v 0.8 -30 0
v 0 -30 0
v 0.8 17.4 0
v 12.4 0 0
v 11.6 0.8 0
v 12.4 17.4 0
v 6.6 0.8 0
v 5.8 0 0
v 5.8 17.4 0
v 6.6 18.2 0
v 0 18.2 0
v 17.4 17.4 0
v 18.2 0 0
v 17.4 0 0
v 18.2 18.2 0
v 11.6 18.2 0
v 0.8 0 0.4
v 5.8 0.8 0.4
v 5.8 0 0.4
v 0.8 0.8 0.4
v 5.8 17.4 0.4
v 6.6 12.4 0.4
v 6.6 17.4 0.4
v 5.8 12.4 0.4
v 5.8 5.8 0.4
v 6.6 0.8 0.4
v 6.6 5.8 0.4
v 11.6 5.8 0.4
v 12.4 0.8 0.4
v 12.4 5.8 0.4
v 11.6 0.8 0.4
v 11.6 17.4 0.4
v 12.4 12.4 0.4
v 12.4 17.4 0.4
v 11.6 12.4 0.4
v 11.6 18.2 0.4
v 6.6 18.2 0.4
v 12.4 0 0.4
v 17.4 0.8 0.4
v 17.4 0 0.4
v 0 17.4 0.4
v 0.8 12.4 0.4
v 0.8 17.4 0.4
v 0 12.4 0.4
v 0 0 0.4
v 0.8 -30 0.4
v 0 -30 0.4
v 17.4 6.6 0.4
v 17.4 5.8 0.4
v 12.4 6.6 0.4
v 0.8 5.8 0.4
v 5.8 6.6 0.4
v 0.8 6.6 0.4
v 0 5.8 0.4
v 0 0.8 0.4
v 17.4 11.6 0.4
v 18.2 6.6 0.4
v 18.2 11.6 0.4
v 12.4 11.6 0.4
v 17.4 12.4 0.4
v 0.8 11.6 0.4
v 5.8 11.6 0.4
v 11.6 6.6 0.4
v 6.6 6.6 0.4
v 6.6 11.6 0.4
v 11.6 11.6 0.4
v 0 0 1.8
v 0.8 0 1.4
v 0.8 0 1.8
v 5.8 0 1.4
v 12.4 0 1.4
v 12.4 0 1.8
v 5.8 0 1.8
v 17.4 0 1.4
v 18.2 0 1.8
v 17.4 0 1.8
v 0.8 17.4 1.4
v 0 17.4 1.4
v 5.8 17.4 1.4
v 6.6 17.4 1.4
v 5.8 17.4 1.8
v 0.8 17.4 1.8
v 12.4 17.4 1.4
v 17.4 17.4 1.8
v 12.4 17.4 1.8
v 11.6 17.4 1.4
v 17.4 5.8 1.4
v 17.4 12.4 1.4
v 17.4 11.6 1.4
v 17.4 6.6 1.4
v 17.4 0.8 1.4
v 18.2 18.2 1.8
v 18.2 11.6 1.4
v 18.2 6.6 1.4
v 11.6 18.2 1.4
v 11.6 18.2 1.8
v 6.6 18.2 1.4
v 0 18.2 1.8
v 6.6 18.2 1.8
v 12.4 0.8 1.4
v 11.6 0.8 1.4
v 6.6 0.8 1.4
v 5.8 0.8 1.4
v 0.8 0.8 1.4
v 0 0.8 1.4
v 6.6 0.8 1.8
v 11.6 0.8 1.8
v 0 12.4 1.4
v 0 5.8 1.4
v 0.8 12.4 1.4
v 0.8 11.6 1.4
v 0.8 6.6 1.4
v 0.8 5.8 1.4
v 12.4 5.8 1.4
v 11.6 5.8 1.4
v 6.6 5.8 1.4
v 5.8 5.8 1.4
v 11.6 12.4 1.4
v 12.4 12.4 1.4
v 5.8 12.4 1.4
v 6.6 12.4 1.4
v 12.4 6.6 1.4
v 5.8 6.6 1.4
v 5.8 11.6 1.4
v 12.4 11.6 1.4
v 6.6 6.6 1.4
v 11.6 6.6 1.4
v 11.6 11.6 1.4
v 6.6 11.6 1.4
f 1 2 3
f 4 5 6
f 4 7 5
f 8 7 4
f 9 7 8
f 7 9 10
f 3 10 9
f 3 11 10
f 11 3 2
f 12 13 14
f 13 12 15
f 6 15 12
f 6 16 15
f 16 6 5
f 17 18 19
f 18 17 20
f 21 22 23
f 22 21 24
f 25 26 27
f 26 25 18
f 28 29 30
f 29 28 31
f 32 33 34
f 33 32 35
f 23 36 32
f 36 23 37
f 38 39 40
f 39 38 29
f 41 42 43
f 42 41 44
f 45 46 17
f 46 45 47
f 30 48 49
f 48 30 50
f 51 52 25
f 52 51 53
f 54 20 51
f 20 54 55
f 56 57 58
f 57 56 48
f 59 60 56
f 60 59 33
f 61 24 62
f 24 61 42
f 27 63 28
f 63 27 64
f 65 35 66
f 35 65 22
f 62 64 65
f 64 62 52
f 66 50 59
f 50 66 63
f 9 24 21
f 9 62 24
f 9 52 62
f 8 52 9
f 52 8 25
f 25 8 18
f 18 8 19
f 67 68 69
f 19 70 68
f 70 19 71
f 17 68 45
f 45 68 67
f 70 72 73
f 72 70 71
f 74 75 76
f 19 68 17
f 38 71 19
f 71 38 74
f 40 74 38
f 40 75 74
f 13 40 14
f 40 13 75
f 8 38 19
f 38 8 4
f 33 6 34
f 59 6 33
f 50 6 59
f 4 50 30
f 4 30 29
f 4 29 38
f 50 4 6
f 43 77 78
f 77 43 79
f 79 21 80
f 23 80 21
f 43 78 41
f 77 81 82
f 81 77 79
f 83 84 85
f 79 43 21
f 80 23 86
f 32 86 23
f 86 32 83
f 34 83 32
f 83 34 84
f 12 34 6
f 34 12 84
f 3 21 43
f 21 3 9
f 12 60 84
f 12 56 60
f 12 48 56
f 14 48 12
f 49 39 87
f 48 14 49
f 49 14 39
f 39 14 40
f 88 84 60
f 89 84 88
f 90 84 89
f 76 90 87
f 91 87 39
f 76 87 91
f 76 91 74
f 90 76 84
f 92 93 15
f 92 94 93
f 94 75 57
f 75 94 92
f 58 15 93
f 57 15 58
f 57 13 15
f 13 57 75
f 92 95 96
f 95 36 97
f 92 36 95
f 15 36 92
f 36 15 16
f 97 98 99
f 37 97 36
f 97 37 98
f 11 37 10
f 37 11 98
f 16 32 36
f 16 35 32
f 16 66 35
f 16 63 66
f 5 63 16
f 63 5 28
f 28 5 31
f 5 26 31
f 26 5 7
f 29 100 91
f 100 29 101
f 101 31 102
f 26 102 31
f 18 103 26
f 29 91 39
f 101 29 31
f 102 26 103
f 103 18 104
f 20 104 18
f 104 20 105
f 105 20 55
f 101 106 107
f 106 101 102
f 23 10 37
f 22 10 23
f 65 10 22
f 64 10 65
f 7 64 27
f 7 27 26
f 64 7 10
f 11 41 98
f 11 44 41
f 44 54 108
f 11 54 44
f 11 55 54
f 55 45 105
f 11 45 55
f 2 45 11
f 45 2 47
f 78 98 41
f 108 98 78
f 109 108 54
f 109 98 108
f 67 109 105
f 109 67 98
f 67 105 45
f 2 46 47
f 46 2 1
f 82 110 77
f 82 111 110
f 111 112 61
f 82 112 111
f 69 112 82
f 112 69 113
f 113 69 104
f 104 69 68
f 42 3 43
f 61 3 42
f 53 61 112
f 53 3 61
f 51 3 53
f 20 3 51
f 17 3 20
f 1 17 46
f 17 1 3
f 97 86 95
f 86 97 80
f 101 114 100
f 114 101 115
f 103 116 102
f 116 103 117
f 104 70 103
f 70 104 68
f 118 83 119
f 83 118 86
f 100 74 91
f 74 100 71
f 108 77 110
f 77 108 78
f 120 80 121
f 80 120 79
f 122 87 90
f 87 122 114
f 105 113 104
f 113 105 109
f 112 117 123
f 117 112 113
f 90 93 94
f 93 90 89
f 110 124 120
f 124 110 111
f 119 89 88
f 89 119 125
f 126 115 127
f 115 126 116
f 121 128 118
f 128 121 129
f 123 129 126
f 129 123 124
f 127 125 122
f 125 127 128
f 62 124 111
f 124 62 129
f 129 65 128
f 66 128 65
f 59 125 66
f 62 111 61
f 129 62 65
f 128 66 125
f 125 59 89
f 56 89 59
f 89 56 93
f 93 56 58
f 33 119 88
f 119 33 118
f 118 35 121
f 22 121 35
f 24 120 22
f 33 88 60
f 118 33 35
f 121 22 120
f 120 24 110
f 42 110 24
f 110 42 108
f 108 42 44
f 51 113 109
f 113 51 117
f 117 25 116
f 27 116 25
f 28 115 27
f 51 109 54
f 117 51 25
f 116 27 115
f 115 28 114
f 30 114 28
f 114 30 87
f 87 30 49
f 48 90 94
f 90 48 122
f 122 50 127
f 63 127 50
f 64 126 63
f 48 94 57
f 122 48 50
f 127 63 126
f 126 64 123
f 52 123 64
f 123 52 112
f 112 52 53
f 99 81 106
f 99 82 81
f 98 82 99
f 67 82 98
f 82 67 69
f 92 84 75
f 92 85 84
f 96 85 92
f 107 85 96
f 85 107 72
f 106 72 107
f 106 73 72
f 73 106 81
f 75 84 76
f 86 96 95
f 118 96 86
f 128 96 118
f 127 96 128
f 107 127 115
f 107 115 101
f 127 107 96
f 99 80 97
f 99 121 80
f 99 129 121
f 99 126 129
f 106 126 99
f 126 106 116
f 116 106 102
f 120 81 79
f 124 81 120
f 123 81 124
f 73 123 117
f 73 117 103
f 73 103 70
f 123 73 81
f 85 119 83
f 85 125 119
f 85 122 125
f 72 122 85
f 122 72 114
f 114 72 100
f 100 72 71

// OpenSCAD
// file: ../../api/v3/reporting.scad
//////////////////////////////////////////////////////////////////////
// LibFile: reporting.scad
// Project: Grid Stack
// FileGroup: API v3 Reporting
// FileSummary: Console report for immutable direct and positive-gap coupons.
// Role: Records the exact environment, dimensions, support strategy, path
//       lengths, qualification status, and deposited-layer counts.
// Requires: API v3 indexes, mathematics, and path generator.
// Exports: report_structural_coupon_object().
//////////////////////////////////////////////////////////////////////

function _bridge_status3(span, process) =
    span <= process[PX3_BRIDGE_MAX]
        ? "within_owner_tested_limit"
        : "exploratory_beyond_owner_tested_limit";

module report_structural_coupon_object(object, report_level = "full") {
    material = object[SCO_MATERIAL];
    nozzle = object[SCO_NOZZLE];
    printer = object[SCO_PRINTER];
    process = object[SCO_PROCESS];
    boundary = object[SCO_BOUNDARY];
    gap = object[SCO_CLEAR_GAP];
    strategy = object[SCO_SUPPORT_STRATEGY];

    echo("--- Grid Stack immutable structural coupon ---");
    echo(str("Object: ", object[SCO_NAME], " revision ", object[SCO_REVISION]));
    echo(str("API/schema: ", object[SCO_REQUIRED_API], "/",
        object[SCO_SCHEMA_VERSION]));
    echo(str("Release/base commit: ", object[SCO_SOURCE_RELEASE], " / ",
        object[SCO_FRAMEWORK_BASE_COMMIT]));
    echo(str("Material/nozzle/printer: ", material[MAT3_FAMILY], " / ",
        nozzle[NZ3_DIAMETER], " mm / ", printer[PRN3_NAME]));
    echo(str("Cells: ", boundary[B3_CELLS_X], " x ", boundary[B3_CELLS_Y]));
    echo(str("Clear spans: ", boundary[B3_CLEAR_SPAN_X], " x ",
        boundary[B3_CLEAR_SPAN_Y], " mm"));
    echo(str("Span status: ",
        _bridge_status3(boundary[B3_CLEAR_SPAN_X], process)));
    echo(str("Outside size: ", boundary_size_x3(boundary, process, nozzle),
        " x ", boundary_size_y3(boundary, process, nozzle), " mm"));
    echo(str("Primitive trace: ", trace_width3(nozzle), " x ",
        trace_height3(process), " mm"));
    echo(str("Structural strand: ", strand_width3(process, nozzle), " x ",
        strand_height3(process), " mm"));
    echo(str("Clear vertical gap: ", gap, " mm"));
    echo(str("Support strategy: ", strategy));
    echo(str("Total modeled height: ", coupon_total_height3(object), " mm"));

    if (report_level == "full") {
        if (strategy == "direct_orthogonal") {
            lower = coupon_path(
                boundary, process, nozzle, 0, object[SCO_LEAD_IN]
            );
            upper = coupon_path(boundary, process, nozzle, 90, 0);
            echo(str("Lower/upper path lengths: ", path_length3(lower),
                " / ", path_length3(upper), " mm"));
            echo(str("Deposited layers: ", 2 * process[PX3_HEIGHT_PASSES]));
        }
        else {
            witness = coupon_path(
                boundary, process, nozzle, 90, object[SCO_LEAD_IN]
            );
            riser = coupon_path(boundary, process, nozzle, 0, 0);
            test = coupon_path(boundary, process, nozzle, 90, 0);
            echo(str("Witness/riser/test path lengths: ",
                path_length3(witness), " / ", path_length3(riser), " / ",
                path_length3(test), " mm"));
            echo(str("Riser deposited layers: ", round(gap_layer_count3(object))));
            echo(str("Total deposited layers: ",
                2 * process[PX3_HEIGHT_PASSES] +
                round(gap_layer_count3(object))));
        }
        echo(str("Status: ", object[SCO_STATUS]));
        echo(str("Notes: ", object[SCO_NOTES]));
    }
}
// file: ../../api/v3/validation.scad
//////////////////////////////////////////////////////////////////////
// LibFile: validation.scad
// Project: Grid Stack
// FileGroup: API v3 Validation
// FileSummary: Validates immutable environment records, count boundaries,
//              support strategy, path continuity, and layer quantization.
// Role: Rejects incompatible or physically floating recipes before geometry
//       is generated.
// Requires: API v3 indexes, mathematics, and path generator.
// Exports: validate_structural_coupon_object().
//////////////////////////////////////////////////////////////////////

module _validate_path3(points, boundary, orientation, lead_in) {
    run_count = orientation == 0
        ? boundary_strand_count_y3(boundary)
        : boundary_strand_count_x3(boundary);

    assert(len(points) == expected_coupon_point_count3(run_count, lead_in),
        "API v3 coupon path has an unexpected point count.");
    assert(!path_has_zero_segment3(points),
        "API v3 coupon path contains a zero-length segment.");
    assert(path_axis_aligned3(points),
        "API v3 coupon path must remain axis-aligned.");
    assert(points[0] != points[len(points) - 1],
        "API v3 coupon path must remain open.");
}

module validate_structural_coupon_object(object) {
    assert(object[SCO_REQUIRED_API] == GRID_STACK_API_VERSION,
        "Saved coupon requires a different Grid Stack API version.");
    assert(object[SCO_SCHEMA_VERSION] == GRID_STACK_COUPON_SCHEMA_VERSION,
        "Saved coupon requires a different coupon schema version.");
    assert(GRID_STACK_RECTANGULAR_FRAMEWORK_VERSION == 2,
        "Saved coupon requires rectangular framework version 2.");

    material = object[SCO_MATERIAL];
    nozzle = object[SCO_NOZZLE];
    printer = object[SCO_PRINTER];
    process = object[SCO_PROCESS];
    boundary = object[SCO_BOUNDARY];
    gap = object[SCO_CLEAR_GAP];
    lead_in = object[SCO_LEAD_IN];
    strategy = object[SCO_SUPPORT_STRATEGY];

    assert(nozzle[NZ3_DIAMETER] > 0,
        "Saved coupon nozzle diameter must be positive.");
    assert(process[PX3_LAYER_H] > 0,
        "Saved coupon layer height must be positive.");
    assert(process[PX3_WIDTH_PASSES] >= 2,
        "Saved coupon structural width requires at least two passes.");
    assert(process[PX3_HEIGHT_PASSES] >= 2,
        "Saved coupon structural height requires at least two layers.");
    assert(process[PX3_MATERIAL] == material[MAT3_NAME],
        "Saved coupon process/material references do not match.");
    assert(process[PX3_NOZZLE] == nozzle[NZ3_NAME],
        "Saved coupon process/nozzle references do not match.");
    assert(process[PX3_PRINTER] == printer[PRN3_NAME],
        "Saved coupon process/printer references do not match.");
    assert(boundary[B3_CELLS_X] > 0 && boundary[B3_CELLS_Y] > 0,
        "Saved coupon cell counts must be positive.");
    assert(boundary[B3_CLEAR_SPAN_X] > 0 &&
           boundary[B3_CLEAR_SPAN_Y] > 0,
        "Saved coupon clear spans must be positive.");
    assert(lead_in >= 0,
        "Saved coupon lead-in cannot be negative.");
    assert(gap >= 0,
        "Saved coupon clear gap cannot be negative.");
    assert(nearly_equal3(gap_layer_count3(object), round(gap_layer_count3(object))),
        "Saved coupon clear gap must equal a whole deposited-layer count.");
    assert(
        (strategy == "direct_orthogonal" && nearly_equal3(gap, 0)) ||
        (strategy == "witness_riser_bridge" && gap > 0),
        "Saved coupon support strategy does not match its clear gap."
    );

    if (strategy == "direct_orthogonal") {
        lower = coupon_path(boundary, process, nozzle, 0, lead_in);
        upper = coupon_path(boundary, process, nozzle, 90, 0);
        _validate_path3(lower, boundary, 0, lead_in);
        _validate_path3(upper, boundary, 90, 0);
        entry = lead_in > 0 ? 1 : 0;
        assert(nearly_equal3(point_distance_2d3(lower[entry], upper[0]), 0),
            "Direct upper path must start on the lower entry crossing.");
    }
    else {
        witness = coupon_path(boundary, process, nozzle, 90, lead_in);
        riser = coupon_path(boundary, process, nozzle, 0, 0);
        test = coupon_path(boundary, process, nozzle, 90, 0);
        _validate_path3(witness, boundary, 90, lead_in);
        _validate_path3(riser, boundary, 0, 0);
        _validate_path3(test, boundary, 90, 0);
        entry = lead_in > 0 ? 1 : 0;
        assert(nearly_equal3(point_distance_2d3(witness[entry], riser[0]), 0),
            "Riser path must start on the witness entry crossing.");
        assert(nearly_equal3(point_distance_2d3(riser[0], test[0]), 0),
            "Upper test path must start on the riser entry crossing.");
        for (i = [0 : len(test) - 1])
            assert(nearly_equal3(point_distance_2d3(test[i], witness[i + entry]), 0),
                "Upper test path must align directly above the witness path.");
    }

    echo("GRID STACK API V3 COUPON VALIDATION: PASS");
}
// file: ../../api/v3/geometry.scad
//////////////////////////////////////////////////////////////////////
// LibFile: geometry.scad
// Project: Grid Stack
// FileGroup: API v3 Printable Geometry
// FileSummary: Creates square-ended structural paths, direct-contact coupons,
//              positive witness/riser/bridge coupons, and simple diagnostics.
// Role: Supplies all geometry used by immutable API v3 recipes without
//       importing mutable workbench geometry.
// Requires: API v3 mathematics and ordered axis-aligned paths.
// Exports: render_direct_coupon(), render_positive_gap_coupon(), and
//          render_coupon_path_debug().
//////////////////////////////////////////////////////////////////////

module _segment_2d3(a, b, width) {
    horizontal = nearly_equal3(a[1], b[1]);
    vertical = nearly_equal3(a[0], b[0]);

    assert(horizontal || vertical,
        "API v3 printable segments must be horizontal or vertical.");
    assert(!nearly_equal3(point_distance_2d3(a, b), 0),
        "API v3 printable segments must have nonzero length.");

    if (horizontal)
        translate([min(a[0], b[0]) - width / 2, a[1] - width / 2])
            square([abs(b[0] - a[0]) + width, width]);
    else
        translate([a[0] - width / 2, min(a[1], b[1]) - width / 2])
            square([width, abs(b[1] - a[1]) + width]);
}

module _path_2d3(points, width) {
    union()
        for (i = [0 : len(points) - 2])
            _segment_2d3(points[i], points[i + 1], width);
}

module _structural_path3(points, process, nozzle) {
    linear_extrude(height = strand_height3(process), convexity = 10)
        _path_2d3(points, strand_width3(process, nozzle));
}

module render_direct_coupon(lower, upper, process, nozzle) {
    union() {
        _structural_path3(lower, process, nozzle);
        translate([0, 0, strand_height3(process)])
            _structural_path3(upper, process, nozzle);
    }
}

module render_positive_gap_coupon(
    witness, riser, test, process, nozzle, clear_gap
) {
    union() {
        _structural_path3(witness, process, nozzle);

        translate([0, 0, strand_height3(process)])
            linear_extrude(height = clear_gap, convexity = 10)
                _path_2d3(riser, strand_width3(process, nozzle));

        translate([0, 0, strand_height3(process) + clear_gap])
            _structural_path3(test, process, nozzle);
    }
}

module _debug_path3(points, z, width) {
    translate([0, 0, z])
        linear_extrude(height = 0.04)
            _path_2d3(points, width);
}

module render_coupon_path_debug(
    lower, upper, riser, process, clear_gap = 0
) {
    width = max(0.12, trace_height3(process));
    _debug_path3(lower, 0, width);
    if (len(riser) > 0)
        _debug_path3(riser, strand_height3(process), width);
    _debug_path3(
        upper,
        strand_height3(process) + clear_gap,
        width
    );
}
// file: ../../api/v3/paths.scad
//////////////////////////////////////////////////////////////////////
// LibFile: paths.scad
// Project: Grid Stack
// FileGroup: API v3 Path Generation
// FileSummary: Generates one open rectangular serpentine centerline from a
//              count boundary for X- or Y-running structural paths.
// Role: Preserves parallel runs, square connectors, optional single lead-in,
//       and one uninterrupted ordered point list per deposited layer.
// Requires: API v3 indexes and mathematics.
// Exports: coupon_path() and expected_coupon_point_count3().
//////////////////////////////////////////////////////////////////////

function _x_rows3(row, count, x_min, x_max, y_min, pitch) =
    row >= count
        ? []
        : let(
            y = y_min + row * pitch,
            x_end = row % 2 == 0 ? x_max : x_min,
            row_end = [x_end, y],
            connector_end = [x_end, y + pitch]
        )
        concat(
            [row_end],
            row < count - 1 ? [connector_end] : [],
            _x_rows3(row + 1, count, x_min, x_max, y_min, pitch)
        );

function _y_columns3(column, count, x_min, y_min, y_max, pitch) =
    column >= count
        ? []
        : let(
            x = x_min + column * pitch,
            y_end = column % 2 == 0 ? y_max : y_min,
            column_end = [x, y_end],
            connector_end = [x + pitch, y_end]
        )
        concat(
            [column_end],
            column < count - 1 ? [connector_end] : [],
            _y_columns3(column + 1, count, x_min, y_min, y_max, pitch)
        );

function expected_coupon_point_count3(run_count, lead_in = 0) =
    2 * run_count + (lead_in > 0 ? 1 : 0);

function coupon_path(
    boundary, process, nozzle, orientation = 0, lead_in = 0
) =
    assert(orientation == 0 || orientation == 90,
        "API v3 coupon orientation must be 0 or 90 degrees.")
    assert(lead_in >= 0,
        "API v3 coupon lead-in cannot be negative.")
    let(
        width = strand_width3(process, nozzle),
        x_min = width / 2,
        y_min = width / 2,
        x_max = boundary_size_x3(boundary, process, nozzle) - width / 2,
        y_max = boundary_size_y3(boundary, process, nozzle) - width / 2,
        entry = [x_min, y_min],
        prefix = lead_in > 0
            ? (orientation == 0
                ? [[x_min - lead_in, y_min], entry]
                : [[x_min, y_min - lead_in], entry])
            : [entry]
    )
    orientation == 0
        ? concat(
            prefix,
            _x_rows3(
                0, boundary_strand_count_y3(boundary),
                x_min, x_max, y_min,
                boundary_pitch_y3(boundary, process, nozzle)
            )
        )
        : concat(
            prefix,
            _y_columns3(
                0, boundary_strand_count_x3(boundary),
                x_min, y_min, y_max,
                boundary_pitch_x3(boundary, process, nozzle)
            )
        );
// file: ../../api/v3/math.scad
//////////////////////////////////////////////////////////////////////
// LibFile: math.scad
// Project: Grid Stack
// FileGroup: API v3 Mathematics
// FileSummary: Pure trace, strand, boundary, path, and layer-count helpers.
// Role: Keeps API v3 calculations isolated and reproducible without importing
//       mutable workbench mathematics.
// Requires: API v3 indexes.
// Exports: nearly_equal3(), trace/strand dimensions, boundary dimensions,
//          path inspection, gap-layer count, and total-height helpers.
//////////////////////////////////////////////////////////////////////

function nearly_equal3(a, b, epsilon = 0.000001) = abs(a - b) <= epsilon;

function trace_width3(nozzle) = nozzle[NZ3_DIAMETER];
function trace_height3(process) = process[PX3_LAYER_H];
function strand_width3(process, nozzle) =
    trace_width3(nozzle) * process[PX3_WIDTH_PASSES];
function strand_height3(process) =
    trace_height3(process) * process[PX3_HEIGHT_PASSES];

function boundary_strand_count_x3(boundary) = boundary[B3_CELLS_X] + 1;
function boundary_strand_count_y3(boundary) = boundary[B3_CELLS_Y] + 1;
function boundary_pitch_x3(boundary, process, nozzle) =
    boundary[B3_CLEAR_SPAN_X] + strand_width3(process, nozzle);
function boundary_pitch_y3(boundary, process, nozzle) =
    boundary[B3_CLEAR_SPAN_Y] + strand_width3(process, nozzle);
function boundary_size_x3(boundary, process, nozzle) =
    boundary[B3_CELLS_X] * boundary[B3_CLEAR_SPAN_X] +
    boundary_strand_count_x3(boundary) * strand_width3(process, nozzle);
function boundary_size_y3(boundary, process, nozzle) =
    boundary[B3_CELLS_Y] * boundary[B3_CLEAR_SPAN_Y] +
    boundary_strand_count_y3(boundary) * strand_width3(process, nozzle);

function point_distance_2d3(a, b) =
    sqrt(pow(b[0] - a[0], 2) + pow(b[1] - a[1], 2));
function path_length3(points, i = 0) =
    i >= len(points) - 1
        ? 0
        : point_distance_2d3(points[i], points[i + 1]) +
          path_length3(points, i + 1);
function path_has_zero_segment3(points, i = 0) =
    i >= len(points) - 1
        ? false
        : nearly_equal3(point_distance_2d3(points[i], points[i + 1]), 0)
            ? true
            : path_has_zero_segment3(points, i + 1);
function segment_axis_aligned3(a, b) =
    nearly_equal3(a[0], b[0]) || nearly_equal3(a[1], b[1]);
function path_axis_aligned3(points, i = 0) =
    i >= len(points) - 1
        ? true
        : segment_axis_aligned3(points[i], points[i + 1]) &&
          path_axis_aligned3(points, i + 1);

function gap_layer_count3(object) =
    object[SCO_CLEAR_GAP] / trace_height3(object[SCO_PROCESS]);
function coupon_total_height3(object) =
    2 * strand_height3(object[SCO_PROCESS]) + object[SCO_CLEAR_GAP];
// file: ../../api/v3/schema.scad
//////////////////////////////////////////////////////////////////////
// LibFile: schema.scad
// Project: Grid Stack
// FileGroup: API v3 Data Model
// FileSummary: Constructors for self-contained immutable structural coupons.
// Role: Makes every geometry-affecting environment and object value explicit
//       inside the saved recipe rather than resolving mutable catalog names.
// Exports: material_spec(), nozzle_spec(), printer_spec(),
//          structural_process_profile(), count_boundary(), and
//          structural_coupon_object().
//////////////////////////////////////////////////////////////////////

function material_spec(
    name, family, flexibility, status = "in_use", notes = ""
) = [name, family, flexibility, status, notes];

function nozzle_spec(
    name, diameter, construction = "brass", status = "in_use", notes = ""
) = [name, diameter, construction, status, notes];

function printer_spec(
    name,
    manufacturer = "",
    model = "",
    motion_system = "",
    build_surface = "",
    status = "unrecorded",
    notes = ""
) = [
    name, manufacturer, model, motion_system,
    build_surface, status, notes
];

function structural_process_profile(
    name,
    material_name,
    nozzle_name,
    printer_name,
    layer_height,
    width_passes,
    height_passes,
    bridge_max,
    qualification,
    revision,
    notes = ""
) = [
    name, material_name, nozzle_name, printer_name,
    layer_height, width_passes, height_passes, bridge_max,
    qualification, revision, notes
];

// Function: count_boundary()
// Synopsis: Stores clear-opening counts and clear spans for one rectangle.
function count_boundary(
    name,
    cells_x,
    cells_y,
    clear_span_x,
    clear_span_y,
    notes = ""
) = [name, cells_x, cells_y, clear_span_x, clear_span_y, notes];

// Function: structural_coupon_object()
// Synopsis: Constructs one permanent coupon recipe.
// Description:
//   framework_base_commit records the last accepted repository state used to
//   begin the API implementation. The Git commit containing this recipe is the
//   authoritative complete source; a file cannot embed its own future hash.
function structural_coupon_object(
    name,
    revision,
    required_api_version,
    coupon_schema_version,
    source_release,
    framework_base_commit,
    material,
    nozzle,
    printer,
    process,
    boundary,
    clear_vertical_gap,
    lead_in,
    support_strategy,
    status = "calibration",
    notes = ""
) = [
    name,
    revision,
    required_api_version,
    coupon_schema_version,
    source_release,
    framework_base_commit,
    material,
    nozzle,
    printer,
    process,
    boundary,
    clear_vertical_gap,
    lead_in,
    support_strategy,
    status,
    notes
];
// file: ../../api/v3/indices.scad
//////////////////////////////////////////////////////////////////////
// LibFile: indices.scad
// Project: Grid Stack
// FileGroup: API v3 Data Model
// FileSummary: Named indexes for immutable structural-coupon records.
// Role: Prevents unexplained numeric indexes from entering saved recipes and
//       keeps API version 3 independent of mutable workbench indexes.
// Exports: MAT3_*, NZ3_*, PRN3_*, PX3_*, B3_*, and SCO_* constants.
//////////////////////////////////////////////////////////////////////

MAT3_NAME = 0;
MAT3_FAMILY = 1;
MAT3_FLEXIBILITY = 2;
MAT3_STATUS = 3;
MAT3_NOTES = 4;

NZ3_NAME = 0;
NZ3_DIAMETER = 1;
NZ3_CONSTRUCTION = 2;
NZ3_STATUS = 3;
NZ3_NOTES = 4;

PRN3_NAME = 0;
PRN3_MANUFACTURER = 1;
PRN3_MODEL = 2;
PRN3_MOTION_SYSTEM = 3;
PRN3_BUILD_SURFACE = 4;
PRN3_STATUS = 5;
PRN3_NOTES = 6;

PX3_NAME = 0;
PX3_MATERIAL = 1;
PX3_NOZZLE = 2;
PX3_PRINTER = 3;
PX3_LAYER_H = 4;
PX3_WIDTH_PASSES = 5;
PX3_HEIGHT_PASSES = 6;
PX3_BRIDGE_MAX = 7;
PX3_QUALIFICATION = 8;
PX3_REVISION = 9;
PX3_NOTES = 10;

B3_NAME = 0;
B3_CELLS_X = 1;
B3_CELLS_Y = 2;
B3_CLEAR_SPAN_X = 3;
B3_CLEAR_SPAN_Y = 4;
B3_NOTES = 5;

SCO_NAME = 0;
SCO_REVISION = 1;
SCO_REQUIRED_API = 2;
SCO_SCHEMA_VERSION = 3;
SCO_SOURCE_RELEASE = 4;
SCO_FRAMEWORK_BASE_COMMIT = 5;
SCO_MATERIAL = 6;
SCO_NOZZLE = 7;
SCO_PRINTER = 8;
SCO_PROCESS = 9;
SCO_BOUNDARY = 10;
SCO_CLEAR_GAP = 11;
SCO_LEAD_IN = 12;
SCO_SUPPORT_STRATEGY = 13;
SCO_STATUS = 14;
SCO_NOTES = 15;
// file: ../../api/grid_stack_v3.scad
//////////////////////////////////////////////////////////////////////
// LibFile: grid_stack_v3.scad
// Project: Grid Stack
// FileGroup: Versioned Public Interface
// FileSummary: Immutable API version 3 for rectangular count-boundary
//              structural coupons, including positive witness/riser gaps.
// Role: Reconstructs saved coupon recipes without Customizer state or mutable
//       workbench catalogs. Incompatible behavior requires a new API file.
// Exports: API/schema constants, record constructors, validation, reporting,
//          and structural_coupon_render().
//////////////////////////////////////////////////////////////////////

GRID_STACK_API_VERSION = 3;
GRID_STACK_COUPON_SCHEMA_VERSION = 1;
GRID_STACK_RECTANGULAR_FRAMEWORK_VERSION = 2;
GRID_STACK_RELEASE = "1.0.0";

include <v3/indices.scad>
include <v3/schema.scad>
include <v3/math.scad>
include <v3/paths.scad>
include <v3/geometry.scad>
include <v3/validation.scad>
include <v3/reporting.scad>

// Module: structural_coupon_render()
// Synopsis: Validates, reports, and renders one immutable coupon recipe.
// Arguments:
//   object = Record returned by structural_coupon_object().
//   mode = print, path_debug, or report_only.
//   report_level = summary or full.
module structural_coupon_render(
    object,
    mode = "print",
    report_level = "full"
) {
    validate_structural_coupon_object(object);
    report_structural_coupon_object(object, report_level);

    boundary = object[SCO_BOUNDARY];
    process = object[SCO_PROCESS];
    nozzle = object[SCO_NOZZLE];
    lead_in = object[SCO_LEAD_IN];
    clear_gap = object[SCO_CLEAR_GAP];
    strategy = object[SCO_SUPPORT_STRATEGY];

    if (strategy == "direct_orthogonal") {
        lower = coupon_path(boundary, process, nozzle, 0, lead_in);
        upper = coupon_path(boundary, process, nozzle, 90, 0);

        if (mode == "print")
            render_direct_coupon(lower, upper, process, nozzle);
        else if (mode == "path_debug")
            render_coupon_path_debug(lower, upper, [], process);
        else if (mode == "report_only")
            echo("Grid Stack API v3 report-only mode: no geometry generated.");
        else
            assert(false, str("Unknown API v3 render mode: ", mode));
    }
    else if (strategy == "witness_riser_bridge") {
        witness = coupon_path(boundary, process, nozzle, 90, lead_in);
        riser = coupon_path(boundary, process, nozzle, 0, 0);
        test = coupon_path(boundary, process, nozzle, 90, 0);

        if (mode == "print")
            render_positive_gap_coupon(
                witness, riser, test, process, nozzle, clear_gap
            );
        else if (mode == "path_debug")
            render_coupon_path_debug(witness, test, riser, process, clear_gap);
        else if (mode == "report_only")
            echo("Grid Stack API v3 report-only mode: no geometry generated.");
        else
            assert(false, str("Unknown API v3 render mode: ", mode));
    }
    else
        assert(false, str("Unknown coupon support strategy: ", strategy));
}
// main file
//////////////////////////////////////////////////////////////////////
// LibFile: coupon-3x3-span5-gap1-pla-plus-0p4-v1.scad
// Project: Grid Stack
// FileGroup: Immutable Structural Coupon
// FileSummary: 3 x 3 PLA+ coupon with 5 mm clear XY spans and 1 mm
//              clear vertical gap using witness_riser_bridge geometry.
// Role: Permanently reconstructs one calibration object without Customizer
//       state or mutable workbench catalog lookup.
// FrameworkBaseCommit: 4b5e564
// Requires: Grid Stack API version 3 and coupon schema version 1.
// Output: Printable continuous-path structural coupon geometry.
//////////////////////////////////////////////////////////////////////

include <../../api/grid_stack_v3.scad>

assert(GRID_STACK_API_VERSION == 3,
    "This recipe requires Grid Stack API version 3.");
assert(GRID_STACK_COUPON_SCHEMA_VERSION == 1,
    "This recipe requires coupon schema version 1.");
assert(GRID_STACK_RECTANGULAR_FRAMEWORK_VERSION == 2,
    "This recipe requires rectangular framework version 2.");

saved_material = material_spec(
    name = "PLA_PLUS",
    family = "PLA+",
    flexibility = "rigid",
    status = "in_use",
    notes = "Exact material family selected for the coupon matrix."
);

saved_nozzle = nozzle_spec(
    name = "BRASS_0P4",
    diameter = 0.4,
    construction = "brass",
    status = "in_use",
    notes = "Nominal nozzle diameter used to derive the 0.8 mm strand width."
);

saved_printer = printer_spec(
    name = "UNRECORDED_PRINTER_R1",
    manufacturer = "",
    model = "",
    motion_system = "",
    build_surface = "",
    status = "unrecorded",
    notes = "Printer identity was not frozen with this coupon framework."
);

saved_process = structural_process_profile(
    name = "PLA_PLUS_0P4_LH0P2_W2_H2_R1",
    material_name = "PLA_PLUS",
    nozzle_name = "BRASS_0P4",
    printer_name = "UNRECORDED_PRINTER_R1",
    layer_height = 0.2,
    width_passes = 2,
    height_passes = 2,
    bridge_max = 6,
    qualification = "owner_tested_to_6mm",
    revision = 1,
    notes = "Primitive trace 0.4 x 0.2 mm; structural strand 0.8 x 0.4 mm."
);

saved_boundary = count_boundary(
    name = "COUNT_3X3_SPAN5",
    cells_x = 3,
    cells_y = 3,
    clear_span_x = 5,
    clear_span_y = 5,
    notes = "Outside dimensions derive from four strands and three clear openings."
);

saved_coupon = structural_coupon_object(
    name = "COUPON_3X3_SPAN5_GAP1_PLA_PLUS_0P4_V1",
    revision = 1,
    required_api_version = 3,
    coupon_schema_version = 1,
    source_release = "1.0.0",
    framework_base_commit = "4b5e564",
    material = saved_material,
    nozzle = saved_nozzle,
    printer = saved_printer,
    process = saved_process,
    boundary = saved_boundary,
    clear_vertical_gap = 1,
    lead_in = 30,
    support_strategy = "witness_riser_bridge",
    status = "calibration_unprinted",
    notes = "Calibration recipe generated from the frozen Batch 010 framework; record results in a new revision after printing."
);

structural_coupon_render(
    saved_coupon,
    mode = "print",
    report_level = "full"
);
